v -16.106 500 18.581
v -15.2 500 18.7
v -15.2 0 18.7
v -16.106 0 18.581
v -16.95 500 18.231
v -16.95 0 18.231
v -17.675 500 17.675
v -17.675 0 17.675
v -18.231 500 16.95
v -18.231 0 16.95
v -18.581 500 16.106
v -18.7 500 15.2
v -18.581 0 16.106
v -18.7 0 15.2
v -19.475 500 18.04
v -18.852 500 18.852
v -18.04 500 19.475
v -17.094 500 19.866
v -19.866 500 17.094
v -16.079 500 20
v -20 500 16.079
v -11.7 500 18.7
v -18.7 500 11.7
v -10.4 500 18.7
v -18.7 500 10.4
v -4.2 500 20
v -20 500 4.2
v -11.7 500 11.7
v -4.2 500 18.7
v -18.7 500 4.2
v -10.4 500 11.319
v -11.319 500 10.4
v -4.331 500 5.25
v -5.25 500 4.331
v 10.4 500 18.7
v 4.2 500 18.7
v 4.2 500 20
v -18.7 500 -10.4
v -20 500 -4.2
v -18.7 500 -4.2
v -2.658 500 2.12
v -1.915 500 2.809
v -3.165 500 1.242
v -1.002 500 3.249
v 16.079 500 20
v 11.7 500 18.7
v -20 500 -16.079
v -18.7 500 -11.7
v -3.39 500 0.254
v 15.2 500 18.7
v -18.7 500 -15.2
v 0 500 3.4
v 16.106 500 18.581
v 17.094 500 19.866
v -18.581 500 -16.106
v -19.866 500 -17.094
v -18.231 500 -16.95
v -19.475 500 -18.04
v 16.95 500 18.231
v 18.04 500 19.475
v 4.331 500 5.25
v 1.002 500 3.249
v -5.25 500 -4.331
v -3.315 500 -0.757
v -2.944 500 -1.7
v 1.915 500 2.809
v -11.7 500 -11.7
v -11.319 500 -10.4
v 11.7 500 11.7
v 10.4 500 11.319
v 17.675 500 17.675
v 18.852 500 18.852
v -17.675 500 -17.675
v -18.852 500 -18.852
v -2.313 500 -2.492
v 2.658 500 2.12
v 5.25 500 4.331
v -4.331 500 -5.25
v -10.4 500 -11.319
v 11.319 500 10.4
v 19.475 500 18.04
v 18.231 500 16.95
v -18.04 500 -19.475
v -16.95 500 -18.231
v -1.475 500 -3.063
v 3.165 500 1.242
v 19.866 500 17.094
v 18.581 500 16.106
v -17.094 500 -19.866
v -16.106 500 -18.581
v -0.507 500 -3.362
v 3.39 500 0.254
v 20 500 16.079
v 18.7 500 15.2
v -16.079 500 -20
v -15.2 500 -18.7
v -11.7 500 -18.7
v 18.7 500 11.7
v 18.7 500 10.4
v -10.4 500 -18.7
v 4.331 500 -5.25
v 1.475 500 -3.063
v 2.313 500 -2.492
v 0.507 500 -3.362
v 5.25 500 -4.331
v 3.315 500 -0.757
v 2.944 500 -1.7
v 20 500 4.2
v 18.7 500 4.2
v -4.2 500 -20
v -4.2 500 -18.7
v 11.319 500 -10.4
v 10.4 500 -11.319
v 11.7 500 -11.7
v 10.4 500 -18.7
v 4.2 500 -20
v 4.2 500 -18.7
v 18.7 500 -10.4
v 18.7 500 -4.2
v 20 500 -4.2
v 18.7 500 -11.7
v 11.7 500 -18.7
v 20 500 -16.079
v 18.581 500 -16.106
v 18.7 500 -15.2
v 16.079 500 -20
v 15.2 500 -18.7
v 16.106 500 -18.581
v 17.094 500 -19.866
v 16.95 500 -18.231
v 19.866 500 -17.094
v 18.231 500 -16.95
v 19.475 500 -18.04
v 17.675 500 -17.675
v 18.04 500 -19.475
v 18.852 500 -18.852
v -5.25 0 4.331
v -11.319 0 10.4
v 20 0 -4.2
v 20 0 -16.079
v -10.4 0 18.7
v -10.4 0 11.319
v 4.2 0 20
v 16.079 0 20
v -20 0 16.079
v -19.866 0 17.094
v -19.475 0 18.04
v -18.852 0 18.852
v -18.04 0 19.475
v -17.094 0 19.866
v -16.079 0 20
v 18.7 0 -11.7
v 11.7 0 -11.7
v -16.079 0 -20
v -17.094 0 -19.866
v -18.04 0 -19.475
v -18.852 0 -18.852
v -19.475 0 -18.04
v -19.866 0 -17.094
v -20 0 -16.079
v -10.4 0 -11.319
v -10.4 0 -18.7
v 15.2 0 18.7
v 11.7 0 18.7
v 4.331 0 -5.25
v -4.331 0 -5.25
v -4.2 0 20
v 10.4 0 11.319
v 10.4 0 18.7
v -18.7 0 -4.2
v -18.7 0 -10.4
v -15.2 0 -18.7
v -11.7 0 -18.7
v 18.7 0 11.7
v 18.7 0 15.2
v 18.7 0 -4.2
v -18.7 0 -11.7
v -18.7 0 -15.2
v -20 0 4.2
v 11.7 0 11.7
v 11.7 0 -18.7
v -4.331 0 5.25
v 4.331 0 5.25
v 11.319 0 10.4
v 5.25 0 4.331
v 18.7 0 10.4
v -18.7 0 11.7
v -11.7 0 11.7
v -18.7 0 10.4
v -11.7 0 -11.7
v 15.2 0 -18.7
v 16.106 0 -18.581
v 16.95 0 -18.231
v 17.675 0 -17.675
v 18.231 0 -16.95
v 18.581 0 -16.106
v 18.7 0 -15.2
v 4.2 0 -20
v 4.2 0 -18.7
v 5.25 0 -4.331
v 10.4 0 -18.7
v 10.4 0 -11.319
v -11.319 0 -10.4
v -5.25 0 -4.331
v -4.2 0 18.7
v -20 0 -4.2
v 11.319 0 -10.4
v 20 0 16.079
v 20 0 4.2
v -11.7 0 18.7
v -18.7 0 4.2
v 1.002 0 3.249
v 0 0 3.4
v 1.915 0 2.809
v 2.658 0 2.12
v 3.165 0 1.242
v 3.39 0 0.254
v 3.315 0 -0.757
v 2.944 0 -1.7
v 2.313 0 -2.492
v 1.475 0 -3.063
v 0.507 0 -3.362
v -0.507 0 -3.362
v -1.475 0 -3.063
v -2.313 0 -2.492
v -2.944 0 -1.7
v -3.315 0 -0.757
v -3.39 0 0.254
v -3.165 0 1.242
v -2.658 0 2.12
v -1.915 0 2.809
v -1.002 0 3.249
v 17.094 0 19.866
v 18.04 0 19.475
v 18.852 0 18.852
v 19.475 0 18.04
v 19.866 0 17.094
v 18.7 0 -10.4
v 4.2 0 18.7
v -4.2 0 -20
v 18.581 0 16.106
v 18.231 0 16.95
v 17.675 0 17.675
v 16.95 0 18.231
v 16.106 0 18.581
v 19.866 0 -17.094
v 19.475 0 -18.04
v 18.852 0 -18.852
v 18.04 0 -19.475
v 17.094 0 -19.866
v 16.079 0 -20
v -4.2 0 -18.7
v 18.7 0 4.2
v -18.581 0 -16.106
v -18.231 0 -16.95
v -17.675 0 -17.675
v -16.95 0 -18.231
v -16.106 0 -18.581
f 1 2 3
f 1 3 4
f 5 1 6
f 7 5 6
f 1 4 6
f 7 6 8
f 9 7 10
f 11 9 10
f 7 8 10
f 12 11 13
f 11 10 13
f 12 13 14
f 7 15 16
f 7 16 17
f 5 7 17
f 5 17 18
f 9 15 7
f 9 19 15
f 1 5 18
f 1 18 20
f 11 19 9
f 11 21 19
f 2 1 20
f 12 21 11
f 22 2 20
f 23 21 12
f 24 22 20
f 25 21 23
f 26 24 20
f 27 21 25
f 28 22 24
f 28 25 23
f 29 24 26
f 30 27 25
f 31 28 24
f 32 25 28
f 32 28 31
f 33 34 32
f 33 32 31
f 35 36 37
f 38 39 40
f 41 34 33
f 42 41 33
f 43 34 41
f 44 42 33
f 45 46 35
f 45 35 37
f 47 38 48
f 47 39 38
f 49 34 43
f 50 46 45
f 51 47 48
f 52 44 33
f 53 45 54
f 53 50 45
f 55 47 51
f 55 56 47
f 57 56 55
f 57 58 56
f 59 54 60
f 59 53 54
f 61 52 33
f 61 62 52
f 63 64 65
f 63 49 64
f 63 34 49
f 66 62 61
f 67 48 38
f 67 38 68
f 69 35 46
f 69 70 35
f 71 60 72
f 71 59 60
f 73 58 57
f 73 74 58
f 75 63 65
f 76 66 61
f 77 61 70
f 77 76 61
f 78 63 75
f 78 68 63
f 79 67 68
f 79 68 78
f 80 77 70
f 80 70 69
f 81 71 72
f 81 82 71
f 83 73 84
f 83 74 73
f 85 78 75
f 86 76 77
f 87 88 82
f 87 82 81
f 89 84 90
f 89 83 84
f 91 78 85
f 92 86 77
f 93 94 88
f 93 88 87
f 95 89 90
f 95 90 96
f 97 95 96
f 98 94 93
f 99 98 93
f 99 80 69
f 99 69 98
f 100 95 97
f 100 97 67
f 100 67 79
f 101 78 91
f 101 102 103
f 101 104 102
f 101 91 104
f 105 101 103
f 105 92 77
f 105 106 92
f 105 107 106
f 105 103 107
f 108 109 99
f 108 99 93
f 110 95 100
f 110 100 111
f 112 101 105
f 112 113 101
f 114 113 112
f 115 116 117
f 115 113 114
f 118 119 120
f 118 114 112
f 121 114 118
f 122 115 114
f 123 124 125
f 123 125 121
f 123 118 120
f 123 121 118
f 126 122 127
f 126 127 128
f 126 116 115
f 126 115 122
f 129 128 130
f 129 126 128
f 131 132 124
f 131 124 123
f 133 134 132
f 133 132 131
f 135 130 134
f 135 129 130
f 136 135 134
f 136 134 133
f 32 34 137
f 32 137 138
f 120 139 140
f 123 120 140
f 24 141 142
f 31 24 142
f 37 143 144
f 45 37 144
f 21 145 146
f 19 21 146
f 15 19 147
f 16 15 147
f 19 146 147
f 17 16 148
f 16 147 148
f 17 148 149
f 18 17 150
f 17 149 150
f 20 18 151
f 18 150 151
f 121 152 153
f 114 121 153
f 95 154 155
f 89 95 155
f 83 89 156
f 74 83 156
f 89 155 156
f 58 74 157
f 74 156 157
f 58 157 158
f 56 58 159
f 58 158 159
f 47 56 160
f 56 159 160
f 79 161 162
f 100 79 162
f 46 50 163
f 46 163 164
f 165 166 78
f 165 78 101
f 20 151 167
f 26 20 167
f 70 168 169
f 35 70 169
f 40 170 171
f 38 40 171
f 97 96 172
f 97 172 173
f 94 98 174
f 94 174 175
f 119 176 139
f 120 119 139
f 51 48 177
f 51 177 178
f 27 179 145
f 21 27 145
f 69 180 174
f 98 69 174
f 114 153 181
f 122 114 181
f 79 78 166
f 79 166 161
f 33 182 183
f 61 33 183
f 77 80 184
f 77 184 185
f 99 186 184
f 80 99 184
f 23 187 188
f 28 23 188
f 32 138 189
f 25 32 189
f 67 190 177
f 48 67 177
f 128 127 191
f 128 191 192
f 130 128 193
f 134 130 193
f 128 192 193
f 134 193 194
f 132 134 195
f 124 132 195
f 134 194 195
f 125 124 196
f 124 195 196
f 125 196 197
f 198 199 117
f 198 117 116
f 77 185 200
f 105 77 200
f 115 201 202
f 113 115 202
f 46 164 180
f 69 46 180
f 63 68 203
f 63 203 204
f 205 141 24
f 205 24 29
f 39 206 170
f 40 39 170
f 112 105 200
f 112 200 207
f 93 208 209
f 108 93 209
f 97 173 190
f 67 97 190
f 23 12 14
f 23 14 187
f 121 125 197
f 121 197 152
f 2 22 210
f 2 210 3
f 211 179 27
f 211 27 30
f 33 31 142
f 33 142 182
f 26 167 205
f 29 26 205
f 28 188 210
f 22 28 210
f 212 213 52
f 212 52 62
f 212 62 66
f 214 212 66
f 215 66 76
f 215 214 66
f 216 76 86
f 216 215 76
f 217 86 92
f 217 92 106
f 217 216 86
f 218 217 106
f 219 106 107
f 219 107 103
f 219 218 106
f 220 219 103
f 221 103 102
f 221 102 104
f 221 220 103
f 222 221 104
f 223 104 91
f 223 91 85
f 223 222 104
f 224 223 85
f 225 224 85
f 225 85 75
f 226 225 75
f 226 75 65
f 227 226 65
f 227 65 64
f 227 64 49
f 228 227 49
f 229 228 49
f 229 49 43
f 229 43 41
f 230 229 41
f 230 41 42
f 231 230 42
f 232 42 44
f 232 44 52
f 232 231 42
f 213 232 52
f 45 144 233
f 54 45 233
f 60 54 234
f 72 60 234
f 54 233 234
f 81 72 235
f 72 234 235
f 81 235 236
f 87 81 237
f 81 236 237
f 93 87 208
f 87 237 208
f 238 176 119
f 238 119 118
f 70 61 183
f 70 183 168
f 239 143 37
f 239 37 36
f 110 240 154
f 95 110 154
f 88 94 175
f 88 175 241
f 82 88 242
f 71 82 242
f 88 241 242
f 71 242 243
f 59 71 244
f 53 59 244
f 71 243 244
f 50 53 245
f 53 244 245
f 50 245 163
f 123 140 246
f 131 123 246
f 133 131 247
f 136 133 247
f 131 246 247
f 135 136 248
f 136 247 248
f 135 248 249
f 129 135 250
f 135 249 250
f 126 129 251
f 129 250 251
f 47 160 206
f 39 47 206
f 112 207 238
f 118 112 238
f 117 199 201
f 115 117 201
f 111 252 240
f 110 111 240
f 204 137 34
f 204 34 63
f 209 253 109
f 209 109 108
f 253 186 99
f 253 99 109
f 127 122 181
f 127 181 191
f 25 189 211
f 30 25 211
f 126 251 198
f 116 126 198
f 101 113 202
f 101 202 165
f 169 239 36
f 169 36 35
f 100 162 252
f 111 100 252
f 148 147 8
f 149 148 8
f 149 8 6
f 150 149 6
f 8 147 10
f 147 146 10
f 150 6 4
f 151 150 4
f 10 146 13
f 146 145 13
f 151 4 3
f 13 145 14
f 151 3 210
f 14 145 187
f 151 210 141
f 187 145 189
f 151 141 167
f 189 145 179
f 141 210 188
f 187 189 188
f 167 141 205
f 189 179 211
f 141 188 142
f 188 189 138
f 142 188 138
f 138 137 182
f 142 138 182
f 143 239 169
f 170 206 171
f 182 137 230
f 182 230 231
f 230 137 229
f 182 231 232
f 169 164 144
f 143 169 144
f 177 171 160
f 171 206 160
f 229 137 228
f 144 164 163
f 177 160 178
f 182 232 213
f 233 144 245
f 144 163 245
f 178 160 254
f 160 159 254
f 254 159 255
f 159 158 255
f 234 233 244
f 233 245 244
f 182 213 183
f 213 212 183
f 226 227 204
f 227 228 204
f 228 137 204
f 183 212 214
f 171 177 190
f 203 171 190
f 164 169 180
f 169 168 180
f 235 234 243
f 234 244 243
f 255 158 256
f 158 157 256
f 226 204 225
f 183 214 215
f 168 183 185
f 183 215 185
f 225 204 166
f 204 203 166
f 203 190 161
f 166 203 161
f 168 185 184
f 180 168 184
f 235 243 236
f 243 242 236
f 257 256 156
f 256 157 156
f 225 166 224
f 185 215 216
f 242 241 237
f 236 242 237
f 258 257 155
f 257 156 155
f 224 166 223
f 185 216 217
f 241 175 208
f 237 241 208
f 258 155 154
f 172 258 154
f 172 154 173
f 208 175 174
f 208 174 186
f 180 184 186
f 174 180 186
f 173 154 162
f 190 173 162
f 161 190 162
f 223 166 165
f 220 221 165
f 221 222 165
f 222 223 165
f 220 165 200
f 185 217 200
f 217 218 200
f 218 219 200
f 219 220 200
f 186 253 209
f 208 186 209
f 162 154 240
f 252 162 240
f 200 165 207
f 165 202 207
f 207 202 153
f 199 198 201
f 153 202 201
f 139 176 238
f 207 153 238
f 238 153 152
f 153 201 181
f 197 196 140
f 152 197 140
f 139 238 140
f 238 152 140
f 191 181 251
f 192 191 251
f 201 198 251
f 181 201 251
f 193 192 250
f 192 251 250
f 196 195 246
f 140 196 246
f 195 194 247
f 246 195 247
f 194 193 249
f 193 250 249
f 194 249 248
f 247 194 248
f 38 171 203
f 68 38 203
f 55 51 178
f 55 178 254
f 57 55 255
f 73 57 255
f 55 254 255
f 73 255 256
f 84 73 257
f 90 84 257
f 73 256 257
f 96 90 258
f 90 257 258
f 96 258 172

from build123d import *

# Parameters (mm, degrees)
SKETCH_1_W      = 6.2
SKETCH_1_H      = 1.3
SKETCH_1_W_2    = 1.3
SKETCH_1_H_2    = 6.2
SKETCH_1_W_3    = 10.5
SKETCH_1_H_3    = 10.5
SKETCH_1_R      = 3.4
EXTRUDE_2_DEPTH = 500


with BuildPart() as part:
    # 草图1 → 凸台-拉伸2 (new body)
    with BuildSketch(Plane(origin=(0, 0, 0), x_dir=(1, 0, 0), z_dir=(0, 1, 0))):
        with Locations((-7.3, -19.35)):
            Rectangle(SKETCH_1_W, SKETCH_1_H)
        with BuildLine():
            Line((-18.7, -10.4), (-20, -10.4))
            Line((-20, -10.4), (-20, -16.079155302))
            ThreePointArc((-20, -16.079155302), (-18.851611176, -18.851611176), (-16.079155302, -20))
            Line((-16.079155302, -20), (-10.4, -20))
            Line((-10.4, -20), (-10.4, -18.7))
            Line((-10.4, -18.7), (-10.4, -11.319238816))
            Line((-10.4, -11.319238816), (-10.4, -10.4))
            Line((-10.4, -10.4), (-11.319238816, -10.4))
            Line((-11.319238816, -10.4), (-18.7, -10.4))
        make_face()
        Polygon((-18.7, -15.2), (-18.7, -11.7), (-15.2, -11.7), (-11.7, -11.7), (-11.7, -15.2), (-11.7, -18.7), (-15.2, -18.7), (-18.7, -18.7), align=None, mode=Mode.SUBTRACT)
        with Locations((-19.35, -7.3)):
            Rectangle(SKETCH_1_W_2, SKETCH_1_H_2)
        with BuildLine():
            ThreePointArc((-15.2, -18.7), (-17.674873734, -17.674873734), (-18.7, -15.2))
            Line((-18.7, -15.2), (-18.7, -18.7))
            Line((-18.7, -18.7), (-15.2, -18.7))
        make_face()
        Polygon((-5.25, -5.25), (-5.25, -4.330761184), (-11.319238816, -10.4), (-10.4, -10.4), (-10.4, -11.319238816), (-4.330761184, -5.25), align=None)
        Rectangle(SKETCH_1_W_3, SKETCH_1_H_3)
        with Locations(Location((0, 0, 0), (0, 0, 270))):
            Circle(SKETCH_1_R, mode=Mode.SUBTRACT)
        Polygon((11.319238816, -10.4), (5.25, -4.330761184), (5.25, -5.25), (4.330761184, -5.25), (10.4, -11.319238816), (10.4, -10.4), align=None)
        Polygon((10.4, 11.319238816), (4.330761184, 5.25), (5.25, 5.25), (5.25, 4.330761184), (11.319238816, 10.4), (10.4, 10.4), align=None)
        Polygon((-4.330761184, 5.25), (-10.4, 11.319238816), (-10.4, 10.4), (-11.319238816, 10.4), (-5.25, 4.330761184), (-5.25, 5.25), align=None)
        with BuildLine():
            Line((18.7, -10.4), (11.319238816, -10.4))
            Line((11.319238816, -10.4), (10.4, -10.4))
            Line((10.4, -10.4), (10.4, -11.319238816))
            Line((10.4, -11.319238816), (10.4, -18.7))
            Line((10.4, -18.7), (10.4, -20))
            Line((10.4, -20), (16.079155302, -20))
            ThreePointArc((16.079155302, -20), (18.851611176, -18.851611176), (20, -16.079155302))
            Line((20, -16.079155302), (20, -10.4))
            Line((20, -10.4), (18.7, -10.4))
        make_face()
        Polygon((15.2, -11.7), (18.7, -11.7), (18.7, -15.2), (18.7, -18.7), (15.2, -18.7), (11.7, -18.7), (11.7, -15.2), (11.7, -11.7), align=None, mode=Mode.SUBTRACT)
        with BuildLine():
            Line((18.7, -18.7), (18.7, -15.2))
            ThreePointArc((18.7, -15.2), (17.674873734, -17.674873734), (15.2, -18.7))
            Line((15.2, -18.7), (18.7, -18.7))
        make_face()
        with BuildLine():
            Line((16.079155302, 20), (10.4, 20))
            Line((10.4, 20), (10.4, 18.7))
            Line((10.4, 18.7), (10.4, 11.319238816))
            Line((10.4, 11.319238816), (10.4, 10.4))
            Line((10.4, 10.4), (11.319238816, 10.4))
            Line((11.319238816, 10.4), (18.7, 10.4))
            Line((18.7, 10.4), (20, 10.4))
            Line((20, 10.4), (20, 16.079155302))
            ThreePointArc((20, 16.079155302), (18.851611176, 18.851611176), (16.079155302, 20))
        make_face()
        Polygon((15.2, 18.7), (18.7, 18.7), (18.7, 15.2), (18.7, 11.7), (15.2, 11.7), (11.7, 11.7), (11.7, 15.2), (11.7, 18.7), align=None, mode=Mode.SUBTRACT)
        with BuildLine():
            Line((18.7, 15.2), (18.7, 18.7))
            Line((18.7, 18.7), (15.2, 18.7))
            ThreePointArc((15.2, 18.7), (17.674873734, 17.674873734), (18.7, 15.2))
        make_face()
        with BuildLine():
            Line((-10.4, 20), (-16.079155302, 20))
            ThreePointArc((-16.079155302, 20), (-18.851611176, 18.851611176), (-20, 16.079155302))
            Line((-20, 16.079155302), (-20, 10.4))
            Line((-20, 10.4), (-18.7, 10.4))
            Line((-18.7, 10.4), (-11.319238816, 10.4))
            Line((-11.319238816, 10.4), (-10.4, 10.4))
            Line((-10.4, 10.4), (-10.4, 11.319238816))
            Line((-10.4, 11.319238816), (-10.4, 18.7))
            Line((-10.4, 18.7), (-10.4, 20))
        make_face()
        Polygon((-15.2, 11.7), (-18.7, 11.7), (-18.7, 15.2), (-18.7, 18.7), (-15.2, 18.7), (-11.7, 18.7), (-11.7, 15.2), (-11.7, 11.7), align=None, mode=Mode.SUBTRACT)
        with BuildLine():
            Line((-18.7, 18.7), (-18.7, 15.2))
            ThreePointArc((-18.7, 15.2), (-17.674873734, 17.674873734), (-15.2, 18.7))
            Line((-15.2, 18.7), (-18.7, 18.7))
        make_face()
        with Locations((-7.3, 19.35)):
            Rectangle(SKETCH_1_W, SKETCH_1_H)
        with Locations((7.3, 19.35)):
            Rectangle(SKETCH_1_W, SKETCH_1_H)
        with Locations((19.35, 7.3)):
            Rectangle(SKETCH_1_W_2, SKETCH_1_H_2)
        with Locations((-19.35, 7.3)):
            Rectangle(SKETCH_1_W_2, SKETCH_1_H_2)
        with Locations((19.35, -7.3)):
            Rectangle(SKETCH_1_W_2, SKETCH_1_H_2)
        with Locations((7.3, -19.35)):
            Rectangle(SKETCH_1_W, SKETCH_1_H)
    extrude(amount=EXTRUDE_2_DEPTH)


solid = part.part
